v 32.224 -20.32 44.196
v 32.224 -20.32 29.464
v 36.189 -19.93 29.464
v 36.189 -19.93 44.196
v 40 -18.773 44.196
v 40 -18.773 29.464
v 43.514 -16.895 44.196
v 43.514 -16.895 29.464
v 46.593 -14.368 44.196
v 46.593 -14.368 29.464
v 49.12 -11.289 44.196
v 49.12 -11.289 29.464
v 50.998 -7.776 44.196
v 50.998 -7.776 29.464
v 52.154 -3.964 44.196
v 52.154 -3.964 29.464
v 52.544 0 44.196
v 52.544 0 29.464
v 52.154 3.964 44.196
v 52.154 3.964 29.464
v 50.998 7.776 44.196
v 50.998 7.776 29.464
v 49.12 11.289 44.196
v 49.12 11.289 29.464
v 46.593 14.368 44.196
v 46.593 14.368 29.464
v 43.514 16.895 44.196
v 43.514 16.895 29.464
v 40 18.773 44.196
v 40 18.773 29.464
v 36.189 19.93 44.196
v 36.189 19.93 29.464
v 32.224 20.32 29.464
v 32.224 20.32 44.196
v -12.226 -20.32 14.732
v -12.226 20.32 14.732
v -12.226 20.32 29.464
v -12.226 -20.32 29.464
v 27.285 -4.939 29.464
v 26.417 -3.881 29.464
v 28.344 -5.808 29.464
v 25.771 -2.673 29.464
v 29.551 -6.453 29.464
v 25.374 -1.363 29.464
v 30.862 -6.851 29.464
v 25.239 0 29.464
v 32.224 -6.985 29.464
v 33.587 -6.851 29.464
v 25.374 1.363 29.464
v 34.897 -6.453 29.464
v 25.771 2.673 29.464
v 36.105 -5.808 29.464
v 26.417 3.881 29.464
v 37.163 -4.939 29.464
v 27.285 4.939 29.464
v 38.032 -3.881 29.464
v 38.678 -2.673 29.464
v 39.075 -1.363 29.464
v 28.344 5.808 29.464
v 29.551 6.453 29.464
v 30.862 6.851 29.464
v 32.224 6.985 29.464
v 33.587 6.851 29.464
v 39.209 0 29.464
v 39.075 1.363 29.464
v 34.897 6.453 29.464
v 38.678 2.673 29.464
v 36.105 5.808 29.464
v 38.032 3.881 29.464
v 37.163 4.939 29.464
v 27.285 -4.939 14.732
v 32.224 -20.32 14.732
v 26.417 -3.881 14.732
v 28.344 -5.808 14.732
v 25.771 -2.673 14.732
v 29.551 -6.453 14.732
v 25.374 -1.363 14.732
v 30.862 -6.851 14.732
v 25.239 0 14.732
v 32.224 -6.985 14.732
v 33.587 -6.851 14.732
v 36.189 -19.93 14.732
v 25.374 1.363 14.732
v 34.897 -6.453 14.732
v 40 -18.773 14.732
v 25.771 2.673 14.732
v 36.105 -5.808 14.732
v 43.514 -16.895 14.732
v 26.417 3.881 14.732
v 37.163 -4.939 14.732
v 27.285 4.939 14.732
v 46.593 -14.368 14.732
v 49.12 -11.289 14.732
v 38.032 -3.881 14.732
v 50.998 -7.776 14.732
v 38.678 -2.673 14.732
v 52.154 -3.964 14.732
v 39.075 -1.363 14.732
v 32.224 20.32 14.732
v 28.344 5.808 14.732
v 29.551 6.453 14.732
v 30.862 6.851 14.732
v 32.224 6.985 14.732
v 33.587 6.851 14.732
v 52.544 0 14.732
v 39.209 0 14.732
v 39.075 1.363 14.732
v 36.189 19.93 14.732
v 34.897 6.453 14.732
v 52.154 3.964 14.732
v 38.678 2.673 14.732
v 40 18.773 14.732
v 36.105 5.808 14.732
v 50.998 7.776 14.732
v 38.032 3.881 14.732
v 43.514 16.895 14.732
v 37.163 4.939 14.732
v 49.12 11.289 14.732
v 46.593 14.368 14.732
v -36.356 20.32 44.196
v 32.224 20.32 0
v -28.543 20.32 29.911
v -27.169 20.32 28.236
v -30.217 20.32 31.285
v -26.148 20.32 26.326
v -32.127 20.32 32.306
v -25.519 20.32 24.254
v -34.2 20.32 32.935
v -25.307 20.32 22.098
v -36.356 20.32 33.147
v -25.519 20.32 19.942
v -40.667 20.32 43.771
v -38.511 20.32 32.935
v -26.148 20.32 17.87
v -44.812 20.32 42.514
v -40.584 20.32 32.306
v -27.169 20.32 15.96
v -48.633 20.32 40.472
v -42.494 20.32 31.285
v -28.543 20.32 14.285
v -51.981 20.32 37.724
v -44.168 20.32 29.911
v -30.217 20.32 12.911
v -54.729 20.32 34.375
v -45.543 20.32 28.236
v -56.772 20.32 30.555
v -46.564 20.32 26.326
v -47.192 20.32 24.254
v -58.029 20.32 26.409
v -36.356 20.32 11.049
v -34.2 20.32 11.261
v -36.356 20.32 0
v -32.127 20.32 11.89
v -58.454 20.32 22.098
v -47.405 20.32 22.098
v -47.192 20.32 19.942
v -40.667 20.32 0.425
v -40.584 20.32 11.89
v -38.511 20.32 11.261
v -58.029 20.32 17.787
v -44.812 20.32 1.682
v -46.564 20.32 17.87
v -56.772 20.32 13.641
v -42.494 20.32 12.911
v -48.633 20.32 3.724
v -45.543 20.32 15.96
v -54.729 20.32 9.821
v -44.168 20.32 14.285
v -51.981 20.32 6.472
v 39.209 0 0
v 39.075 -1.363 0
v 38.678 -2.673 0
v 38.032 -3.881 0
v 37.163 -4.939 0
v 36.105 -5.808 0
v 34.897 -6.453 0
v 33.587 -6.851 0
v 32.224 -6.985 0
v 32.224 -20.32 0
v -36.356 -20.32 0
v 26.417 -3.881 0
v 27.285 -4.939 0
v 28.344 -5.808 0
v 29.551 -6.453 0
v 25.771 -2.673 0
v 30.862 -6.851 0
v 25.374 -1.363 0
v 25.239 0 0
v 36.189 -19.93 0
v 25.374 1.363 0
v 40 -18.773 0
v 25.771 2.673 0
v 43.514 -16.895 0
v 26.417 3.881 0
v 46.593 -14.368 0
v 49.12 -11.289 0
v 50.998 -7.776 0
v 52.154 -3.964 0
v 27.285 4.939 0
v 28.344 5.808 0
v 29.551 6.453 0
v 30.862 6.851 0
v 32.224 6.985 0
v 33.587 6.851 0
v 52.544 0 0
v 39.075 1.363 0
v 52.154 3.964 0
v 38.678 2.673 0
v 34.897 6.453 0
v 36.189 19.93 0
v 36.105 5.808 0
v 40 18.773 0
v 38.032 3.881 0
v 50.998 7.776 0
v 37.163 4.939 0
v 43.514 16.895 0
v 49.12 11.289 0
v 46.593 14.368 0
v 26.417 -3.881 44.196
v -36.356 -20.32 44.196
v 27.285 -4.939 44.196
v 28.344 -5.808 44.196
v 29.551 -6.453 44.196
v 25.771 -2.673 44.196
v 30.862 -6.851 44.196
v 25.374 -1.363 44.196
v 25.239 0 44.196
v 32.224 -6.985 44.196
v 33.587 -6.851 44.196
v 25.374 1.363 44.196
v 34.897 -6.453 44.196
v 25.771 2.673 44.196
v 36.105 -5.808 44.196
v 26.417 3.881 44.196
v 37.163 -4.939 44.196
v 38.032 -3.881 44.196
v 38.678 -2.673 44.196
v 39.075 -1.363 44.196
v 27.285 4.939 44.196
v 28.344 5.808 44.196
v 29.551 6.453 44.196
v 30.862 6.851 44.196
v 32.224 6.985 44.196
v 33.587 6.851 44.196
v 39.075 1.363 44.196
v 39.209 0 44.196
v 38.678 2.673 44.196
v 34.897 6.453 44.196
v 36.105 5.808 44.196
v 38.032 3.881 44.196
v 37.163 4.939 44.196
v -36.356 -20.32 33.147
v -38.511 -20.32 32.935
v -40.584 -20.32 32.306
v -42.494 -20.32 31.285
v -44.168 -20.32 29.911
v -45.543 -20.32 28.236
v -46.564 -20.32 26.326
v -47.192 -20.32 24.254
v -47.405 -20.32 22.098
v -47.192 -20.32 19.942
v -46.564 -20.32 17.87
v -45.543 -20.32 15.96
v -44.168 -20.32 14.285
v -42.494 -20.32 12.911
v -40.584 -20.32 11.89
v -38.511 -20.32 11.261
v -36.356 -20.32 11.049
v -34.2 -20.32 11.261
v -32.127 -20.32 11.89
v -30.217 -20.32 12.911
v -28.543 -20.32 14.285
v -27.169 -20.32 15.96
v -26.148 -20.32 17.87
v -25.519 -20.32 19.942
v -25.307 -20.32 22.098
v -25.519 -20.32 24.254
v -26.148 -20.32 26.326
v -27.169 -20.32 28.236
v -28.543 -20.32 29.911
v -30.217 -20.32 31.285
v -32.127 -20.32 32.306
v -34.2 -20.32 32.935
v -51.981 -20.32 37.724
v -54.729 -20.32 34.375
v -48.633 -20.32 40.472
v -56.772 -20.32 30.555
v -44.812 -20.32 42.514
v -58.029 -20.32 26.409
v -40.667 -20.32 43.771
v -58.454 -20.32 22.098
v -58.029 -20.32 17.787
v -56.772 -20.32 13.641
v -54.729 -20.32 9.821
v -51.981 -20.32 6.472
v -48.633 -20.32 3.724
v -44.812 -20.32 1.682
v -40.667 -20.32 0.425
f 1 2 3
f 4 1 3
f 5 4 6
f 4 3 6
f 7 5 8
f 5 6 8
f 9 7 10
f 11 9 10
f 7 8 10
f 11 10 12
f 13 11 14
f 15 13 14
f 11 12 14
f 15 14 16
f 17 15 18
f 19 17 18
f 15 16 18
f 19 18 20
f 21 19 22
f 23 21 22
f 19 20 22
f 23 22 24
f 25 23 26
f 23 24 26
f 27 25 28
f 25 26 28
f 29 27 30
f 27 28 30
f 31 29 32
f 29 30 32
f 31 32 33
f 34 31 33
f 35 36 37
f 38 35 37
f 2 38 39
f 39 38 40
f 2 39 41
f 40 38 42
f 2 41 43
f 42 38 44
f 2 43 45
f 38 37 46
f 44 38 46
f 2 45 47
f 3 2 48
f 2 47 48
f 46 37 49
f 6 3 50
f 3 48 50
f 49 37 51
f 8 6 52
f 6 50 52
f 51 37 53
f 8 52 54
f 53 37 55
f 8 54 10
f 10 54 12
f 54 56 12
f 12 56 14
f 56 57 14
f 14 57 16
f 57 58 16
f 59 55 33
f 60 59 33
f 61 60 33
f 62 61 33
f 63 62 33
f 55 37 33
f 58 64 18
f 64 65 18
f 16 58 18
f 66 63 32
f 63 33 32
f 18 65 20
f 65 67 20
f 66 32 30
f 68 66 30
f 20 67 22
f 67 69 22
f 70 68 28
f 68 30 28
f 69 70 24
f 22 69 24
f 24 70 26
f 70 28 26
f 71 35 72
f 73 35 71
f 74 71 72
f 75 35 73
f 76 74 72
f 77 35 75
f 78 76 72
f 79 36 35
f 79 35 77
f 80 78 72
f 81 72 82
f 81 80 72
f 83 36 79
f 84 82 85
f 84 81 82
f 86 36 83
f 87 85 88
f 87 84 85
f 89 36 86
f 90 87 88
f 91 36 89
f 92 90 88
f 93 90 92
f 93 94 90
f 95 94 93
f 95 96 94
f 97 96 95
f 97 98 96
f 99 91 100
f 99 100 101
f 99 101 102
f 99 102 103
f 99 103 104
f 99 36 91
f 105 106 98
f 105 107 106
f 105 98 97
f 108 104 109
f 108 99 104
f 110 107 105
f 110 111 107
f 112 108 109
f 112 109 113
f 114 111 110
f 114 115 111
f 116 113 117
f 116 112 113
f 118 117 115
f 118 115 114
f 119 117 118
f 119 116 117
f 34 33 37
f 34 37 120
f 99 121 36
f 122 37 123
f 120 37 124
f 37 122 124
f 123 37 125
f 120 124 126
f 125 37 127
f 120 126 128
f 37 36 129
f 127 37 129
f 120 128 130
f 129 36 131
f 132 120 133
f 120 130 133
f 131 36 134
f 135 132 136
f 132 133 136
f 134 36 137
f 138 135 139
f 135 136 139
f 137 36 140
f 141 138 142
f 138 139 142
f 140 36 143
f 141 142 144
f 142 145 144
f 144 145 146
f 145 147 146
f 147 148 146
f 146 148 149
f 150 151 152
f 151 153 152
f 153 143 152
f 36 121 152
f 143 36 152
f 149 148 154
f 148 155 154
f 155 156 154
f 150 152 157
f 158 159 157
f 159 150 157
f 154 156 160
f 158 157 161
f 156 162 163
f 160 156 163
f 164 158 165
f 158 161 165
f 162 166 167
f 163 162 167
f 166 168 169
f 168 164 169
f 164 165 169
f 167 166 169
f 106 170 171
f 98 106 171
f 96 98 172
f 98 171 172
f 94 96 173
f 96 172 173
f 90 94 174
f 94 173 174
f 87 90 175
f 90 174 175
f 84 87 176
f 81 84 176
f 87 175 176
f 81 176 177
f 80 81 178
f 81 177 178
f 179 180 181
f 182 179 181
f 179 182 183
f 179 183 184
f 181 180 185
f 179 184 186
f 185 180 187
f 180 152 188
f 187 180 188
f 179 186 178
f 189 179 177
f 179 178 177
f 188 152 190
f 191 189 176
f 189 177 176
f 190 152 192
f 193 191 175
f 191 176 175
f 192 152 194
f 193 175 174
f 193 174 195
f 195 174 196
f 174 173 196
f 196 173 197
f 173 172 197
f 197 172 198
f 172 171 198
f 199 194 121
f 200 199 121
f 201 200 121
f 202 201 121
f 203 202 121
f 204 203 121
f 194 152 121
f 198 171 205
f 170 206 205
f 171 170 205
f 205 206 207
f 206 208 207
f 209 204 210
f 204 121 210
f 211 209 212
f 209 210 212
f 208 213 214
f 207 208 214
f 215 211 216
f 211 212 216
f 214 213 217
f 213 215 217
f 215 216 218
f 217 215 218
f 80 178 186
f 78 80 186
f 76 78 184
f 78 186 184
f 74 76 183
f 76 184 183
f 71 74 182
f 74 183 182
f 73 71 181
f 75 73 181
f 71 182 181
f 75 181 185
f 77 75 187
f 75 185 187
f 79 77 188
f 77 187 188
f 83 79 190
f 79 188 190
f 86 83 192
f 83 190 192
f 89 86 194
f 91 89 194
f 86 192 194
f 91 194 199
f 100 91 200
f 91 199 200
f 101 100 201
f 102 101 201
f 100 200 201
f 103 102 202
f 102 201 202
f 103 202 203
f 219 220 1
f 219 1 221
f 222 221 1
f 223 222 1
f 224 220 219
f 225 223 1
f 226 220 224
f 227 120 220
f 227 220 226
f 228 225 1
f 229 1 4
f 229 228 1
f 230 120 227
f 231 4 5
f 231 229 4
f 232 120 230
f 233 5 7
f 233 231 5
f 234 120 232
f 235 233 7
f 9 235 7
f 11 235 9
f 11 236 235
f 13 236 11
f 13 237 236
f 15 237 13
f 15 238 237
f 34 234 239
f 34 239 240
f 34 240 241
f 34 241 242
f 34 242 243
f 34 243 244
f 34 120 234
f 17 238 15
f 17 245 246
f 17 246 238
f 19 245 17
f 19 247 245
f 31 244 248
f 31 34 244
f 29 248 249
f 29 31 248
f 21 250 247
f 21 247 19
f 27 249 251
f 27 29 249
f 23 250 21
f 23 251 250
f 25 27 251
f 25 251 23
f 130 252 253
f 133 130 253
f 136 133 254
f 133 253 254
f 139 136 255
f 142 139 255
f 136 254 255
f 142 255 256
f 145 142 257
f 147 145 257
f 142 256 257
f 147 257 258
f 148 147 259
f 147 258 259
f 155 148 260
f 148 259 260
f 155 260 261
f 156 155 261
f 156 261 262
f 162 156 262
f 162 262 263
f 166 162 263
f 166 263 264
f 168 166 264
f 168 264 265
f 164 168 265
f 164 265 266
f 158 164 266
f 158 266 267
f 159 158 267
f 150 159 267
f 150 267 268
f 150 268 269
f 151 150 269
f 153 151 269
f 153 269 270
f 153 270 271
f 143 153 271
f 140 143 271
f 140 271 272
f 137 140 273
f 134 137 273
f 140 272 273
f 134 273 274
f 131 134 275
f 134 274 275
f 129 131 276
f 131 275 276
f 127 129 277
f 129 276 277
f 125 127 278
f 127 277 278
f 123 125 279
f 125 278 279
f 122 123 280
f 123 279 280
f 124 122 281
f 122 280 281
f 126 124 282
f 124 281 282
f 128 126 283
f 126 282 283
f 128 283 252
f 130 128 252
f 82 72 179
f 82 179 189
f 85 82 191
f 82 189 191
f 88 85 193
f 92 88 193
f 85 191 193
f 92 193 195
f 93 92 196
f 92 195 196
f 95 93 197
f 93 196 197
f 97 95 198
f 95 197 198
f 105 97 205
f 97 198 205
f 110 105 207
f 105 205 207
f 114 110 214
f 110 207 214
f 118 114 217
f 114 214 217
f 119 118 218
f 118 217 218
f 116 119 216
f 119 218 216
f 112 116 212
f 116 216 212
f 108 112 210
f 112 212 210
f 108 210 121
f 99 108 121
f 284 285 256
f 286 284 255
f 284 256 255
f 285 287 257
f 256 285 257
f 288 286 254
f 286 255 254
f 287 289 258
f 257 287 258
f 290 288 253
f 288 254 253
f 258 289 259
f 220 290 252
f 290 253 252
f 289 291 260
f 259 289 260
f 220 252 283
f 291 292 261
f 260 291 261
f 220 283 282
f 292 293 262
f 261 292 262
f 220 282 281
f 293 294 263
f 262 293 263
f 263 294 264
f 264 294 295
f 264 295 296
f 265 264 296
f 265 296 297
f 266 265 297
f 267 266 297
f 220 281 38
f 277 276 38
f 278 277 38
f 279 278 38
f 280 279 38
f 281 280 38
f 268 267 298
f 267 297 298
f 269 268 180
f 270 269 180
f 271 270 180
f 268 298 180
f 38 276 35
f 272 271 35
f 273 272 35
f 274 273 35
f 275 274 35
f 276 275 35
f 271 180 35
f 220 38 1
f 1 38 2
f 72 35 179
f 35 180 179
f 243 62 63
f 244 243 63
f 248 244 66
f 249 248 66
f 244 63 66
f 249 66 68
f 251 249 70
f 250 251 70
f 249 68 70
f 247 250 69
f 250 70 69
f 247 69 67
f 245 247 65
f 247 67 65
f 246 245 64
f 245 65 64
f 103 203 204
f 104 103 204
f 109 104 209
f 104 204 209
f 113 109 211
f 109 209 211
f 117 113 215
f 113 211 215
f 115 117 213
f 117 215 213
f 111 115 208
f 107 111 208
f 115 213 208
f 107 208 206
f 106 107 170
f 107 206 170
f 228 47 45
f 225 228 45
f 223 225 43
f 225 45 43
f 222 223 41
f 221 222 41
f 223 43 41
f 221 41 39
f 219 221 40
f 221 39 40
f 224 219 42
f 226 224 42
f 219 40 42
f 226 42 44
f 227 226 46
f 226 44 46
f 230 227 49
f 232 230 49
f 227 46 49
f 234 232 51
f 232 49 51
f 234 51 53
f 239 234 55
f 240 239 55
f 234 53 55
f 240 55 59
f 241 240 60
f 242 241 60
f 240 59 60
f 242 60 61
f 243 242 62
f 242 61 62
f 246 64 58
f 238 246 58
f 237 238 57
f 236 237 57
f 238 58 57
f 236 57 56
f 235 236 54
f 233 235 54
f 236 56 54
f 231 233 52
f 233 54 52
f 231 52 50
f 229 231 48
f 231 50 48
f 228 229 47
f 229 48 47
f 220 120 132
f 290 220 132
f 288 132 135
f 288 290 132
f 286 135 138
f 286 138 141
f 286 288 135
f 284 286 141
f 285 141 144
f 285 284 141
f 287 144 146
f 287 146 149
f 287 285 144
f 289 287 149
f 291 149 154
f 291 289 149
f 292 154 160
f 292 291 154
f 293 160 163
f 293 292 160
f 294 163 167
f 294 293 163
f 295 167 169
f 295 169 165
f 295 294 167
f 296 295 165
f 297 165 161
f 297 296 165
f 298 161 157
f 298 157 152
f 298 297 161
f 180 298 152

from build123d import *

# Parameters (mm, degrees)
F3_DEPTH = 44.196
F1_W     = 64.77
F1_H     = 14.732
F2_R     = 11.049
F4_DEPTH = 25.4
F2_R_2   = 22.098
F5_DEPTH = 20.32


with BuildPart() as f3:
    # F0 (on Top) → F3 (new body)
    with BuildSketch(Plane.XY):
        with BuildLine():
            Line((32.224336, 20.32), (-36.355664, 20.32))
            Line((-36.355664, 20.32), (-36.355664, -20.32))
            Line((-36.355664, -20.32), (32.224336, -20.32))
            Line((32.224336, -20.32), (32.224336, -6.985))
            ThreePointArc((32.224336, -6.985), (25.239336, 0), (32.224336, 6.985))
            Line((32.224336, 6.985), (32.224336, 20.32))
        make_face()
        with BuildLine():
            ThreePointArc((32.224336, -20.32), (52.544336, 0), (32.224336, 20.32))
            Line((32.224336, 20.32), (32.224336, 6.985))
            ThreePointArc((32.224336, 6.985), (37.163477, 4.939141), (39.209336, 0))
            ThreePointArc((39.209336, 0), (37.163477, -4.939141), (32.224336, -6.985))
            Line((32.224336, -6.985), (32.224336, -20.32))
        make_face()
    extrude(amount=F3_DEPTH)

    # F1 (on Front) + F2 (on Front) → F4 (cut, symmetric)
    with BuildSketch(Plane.XZ):
        with Locations((20.159336, 22.098)):
            Rectangle(F1_W, F1_H)
    with BuildSketch(Plane.XZ):
        with Locations((-36.355664, 22.098)):
            Circle(F2_R)
    extrude(amount=F4_DEPTH, both=True, mode=Mode.SUBTRACT)

    # F2 (on Front) → F5 (join, symmetric)
    with BuildSketch(Plane.XZ):
        with Locations((-36.355664, 22.098)):
            Circle(F2_R_2)
        with Locations((-36.355664, 22.098)):
            Circle(F2_R, mode=Mode.SUBTRACT)
    extrude(amount=F5_DEPTH, both=True)


solid = f3.part
